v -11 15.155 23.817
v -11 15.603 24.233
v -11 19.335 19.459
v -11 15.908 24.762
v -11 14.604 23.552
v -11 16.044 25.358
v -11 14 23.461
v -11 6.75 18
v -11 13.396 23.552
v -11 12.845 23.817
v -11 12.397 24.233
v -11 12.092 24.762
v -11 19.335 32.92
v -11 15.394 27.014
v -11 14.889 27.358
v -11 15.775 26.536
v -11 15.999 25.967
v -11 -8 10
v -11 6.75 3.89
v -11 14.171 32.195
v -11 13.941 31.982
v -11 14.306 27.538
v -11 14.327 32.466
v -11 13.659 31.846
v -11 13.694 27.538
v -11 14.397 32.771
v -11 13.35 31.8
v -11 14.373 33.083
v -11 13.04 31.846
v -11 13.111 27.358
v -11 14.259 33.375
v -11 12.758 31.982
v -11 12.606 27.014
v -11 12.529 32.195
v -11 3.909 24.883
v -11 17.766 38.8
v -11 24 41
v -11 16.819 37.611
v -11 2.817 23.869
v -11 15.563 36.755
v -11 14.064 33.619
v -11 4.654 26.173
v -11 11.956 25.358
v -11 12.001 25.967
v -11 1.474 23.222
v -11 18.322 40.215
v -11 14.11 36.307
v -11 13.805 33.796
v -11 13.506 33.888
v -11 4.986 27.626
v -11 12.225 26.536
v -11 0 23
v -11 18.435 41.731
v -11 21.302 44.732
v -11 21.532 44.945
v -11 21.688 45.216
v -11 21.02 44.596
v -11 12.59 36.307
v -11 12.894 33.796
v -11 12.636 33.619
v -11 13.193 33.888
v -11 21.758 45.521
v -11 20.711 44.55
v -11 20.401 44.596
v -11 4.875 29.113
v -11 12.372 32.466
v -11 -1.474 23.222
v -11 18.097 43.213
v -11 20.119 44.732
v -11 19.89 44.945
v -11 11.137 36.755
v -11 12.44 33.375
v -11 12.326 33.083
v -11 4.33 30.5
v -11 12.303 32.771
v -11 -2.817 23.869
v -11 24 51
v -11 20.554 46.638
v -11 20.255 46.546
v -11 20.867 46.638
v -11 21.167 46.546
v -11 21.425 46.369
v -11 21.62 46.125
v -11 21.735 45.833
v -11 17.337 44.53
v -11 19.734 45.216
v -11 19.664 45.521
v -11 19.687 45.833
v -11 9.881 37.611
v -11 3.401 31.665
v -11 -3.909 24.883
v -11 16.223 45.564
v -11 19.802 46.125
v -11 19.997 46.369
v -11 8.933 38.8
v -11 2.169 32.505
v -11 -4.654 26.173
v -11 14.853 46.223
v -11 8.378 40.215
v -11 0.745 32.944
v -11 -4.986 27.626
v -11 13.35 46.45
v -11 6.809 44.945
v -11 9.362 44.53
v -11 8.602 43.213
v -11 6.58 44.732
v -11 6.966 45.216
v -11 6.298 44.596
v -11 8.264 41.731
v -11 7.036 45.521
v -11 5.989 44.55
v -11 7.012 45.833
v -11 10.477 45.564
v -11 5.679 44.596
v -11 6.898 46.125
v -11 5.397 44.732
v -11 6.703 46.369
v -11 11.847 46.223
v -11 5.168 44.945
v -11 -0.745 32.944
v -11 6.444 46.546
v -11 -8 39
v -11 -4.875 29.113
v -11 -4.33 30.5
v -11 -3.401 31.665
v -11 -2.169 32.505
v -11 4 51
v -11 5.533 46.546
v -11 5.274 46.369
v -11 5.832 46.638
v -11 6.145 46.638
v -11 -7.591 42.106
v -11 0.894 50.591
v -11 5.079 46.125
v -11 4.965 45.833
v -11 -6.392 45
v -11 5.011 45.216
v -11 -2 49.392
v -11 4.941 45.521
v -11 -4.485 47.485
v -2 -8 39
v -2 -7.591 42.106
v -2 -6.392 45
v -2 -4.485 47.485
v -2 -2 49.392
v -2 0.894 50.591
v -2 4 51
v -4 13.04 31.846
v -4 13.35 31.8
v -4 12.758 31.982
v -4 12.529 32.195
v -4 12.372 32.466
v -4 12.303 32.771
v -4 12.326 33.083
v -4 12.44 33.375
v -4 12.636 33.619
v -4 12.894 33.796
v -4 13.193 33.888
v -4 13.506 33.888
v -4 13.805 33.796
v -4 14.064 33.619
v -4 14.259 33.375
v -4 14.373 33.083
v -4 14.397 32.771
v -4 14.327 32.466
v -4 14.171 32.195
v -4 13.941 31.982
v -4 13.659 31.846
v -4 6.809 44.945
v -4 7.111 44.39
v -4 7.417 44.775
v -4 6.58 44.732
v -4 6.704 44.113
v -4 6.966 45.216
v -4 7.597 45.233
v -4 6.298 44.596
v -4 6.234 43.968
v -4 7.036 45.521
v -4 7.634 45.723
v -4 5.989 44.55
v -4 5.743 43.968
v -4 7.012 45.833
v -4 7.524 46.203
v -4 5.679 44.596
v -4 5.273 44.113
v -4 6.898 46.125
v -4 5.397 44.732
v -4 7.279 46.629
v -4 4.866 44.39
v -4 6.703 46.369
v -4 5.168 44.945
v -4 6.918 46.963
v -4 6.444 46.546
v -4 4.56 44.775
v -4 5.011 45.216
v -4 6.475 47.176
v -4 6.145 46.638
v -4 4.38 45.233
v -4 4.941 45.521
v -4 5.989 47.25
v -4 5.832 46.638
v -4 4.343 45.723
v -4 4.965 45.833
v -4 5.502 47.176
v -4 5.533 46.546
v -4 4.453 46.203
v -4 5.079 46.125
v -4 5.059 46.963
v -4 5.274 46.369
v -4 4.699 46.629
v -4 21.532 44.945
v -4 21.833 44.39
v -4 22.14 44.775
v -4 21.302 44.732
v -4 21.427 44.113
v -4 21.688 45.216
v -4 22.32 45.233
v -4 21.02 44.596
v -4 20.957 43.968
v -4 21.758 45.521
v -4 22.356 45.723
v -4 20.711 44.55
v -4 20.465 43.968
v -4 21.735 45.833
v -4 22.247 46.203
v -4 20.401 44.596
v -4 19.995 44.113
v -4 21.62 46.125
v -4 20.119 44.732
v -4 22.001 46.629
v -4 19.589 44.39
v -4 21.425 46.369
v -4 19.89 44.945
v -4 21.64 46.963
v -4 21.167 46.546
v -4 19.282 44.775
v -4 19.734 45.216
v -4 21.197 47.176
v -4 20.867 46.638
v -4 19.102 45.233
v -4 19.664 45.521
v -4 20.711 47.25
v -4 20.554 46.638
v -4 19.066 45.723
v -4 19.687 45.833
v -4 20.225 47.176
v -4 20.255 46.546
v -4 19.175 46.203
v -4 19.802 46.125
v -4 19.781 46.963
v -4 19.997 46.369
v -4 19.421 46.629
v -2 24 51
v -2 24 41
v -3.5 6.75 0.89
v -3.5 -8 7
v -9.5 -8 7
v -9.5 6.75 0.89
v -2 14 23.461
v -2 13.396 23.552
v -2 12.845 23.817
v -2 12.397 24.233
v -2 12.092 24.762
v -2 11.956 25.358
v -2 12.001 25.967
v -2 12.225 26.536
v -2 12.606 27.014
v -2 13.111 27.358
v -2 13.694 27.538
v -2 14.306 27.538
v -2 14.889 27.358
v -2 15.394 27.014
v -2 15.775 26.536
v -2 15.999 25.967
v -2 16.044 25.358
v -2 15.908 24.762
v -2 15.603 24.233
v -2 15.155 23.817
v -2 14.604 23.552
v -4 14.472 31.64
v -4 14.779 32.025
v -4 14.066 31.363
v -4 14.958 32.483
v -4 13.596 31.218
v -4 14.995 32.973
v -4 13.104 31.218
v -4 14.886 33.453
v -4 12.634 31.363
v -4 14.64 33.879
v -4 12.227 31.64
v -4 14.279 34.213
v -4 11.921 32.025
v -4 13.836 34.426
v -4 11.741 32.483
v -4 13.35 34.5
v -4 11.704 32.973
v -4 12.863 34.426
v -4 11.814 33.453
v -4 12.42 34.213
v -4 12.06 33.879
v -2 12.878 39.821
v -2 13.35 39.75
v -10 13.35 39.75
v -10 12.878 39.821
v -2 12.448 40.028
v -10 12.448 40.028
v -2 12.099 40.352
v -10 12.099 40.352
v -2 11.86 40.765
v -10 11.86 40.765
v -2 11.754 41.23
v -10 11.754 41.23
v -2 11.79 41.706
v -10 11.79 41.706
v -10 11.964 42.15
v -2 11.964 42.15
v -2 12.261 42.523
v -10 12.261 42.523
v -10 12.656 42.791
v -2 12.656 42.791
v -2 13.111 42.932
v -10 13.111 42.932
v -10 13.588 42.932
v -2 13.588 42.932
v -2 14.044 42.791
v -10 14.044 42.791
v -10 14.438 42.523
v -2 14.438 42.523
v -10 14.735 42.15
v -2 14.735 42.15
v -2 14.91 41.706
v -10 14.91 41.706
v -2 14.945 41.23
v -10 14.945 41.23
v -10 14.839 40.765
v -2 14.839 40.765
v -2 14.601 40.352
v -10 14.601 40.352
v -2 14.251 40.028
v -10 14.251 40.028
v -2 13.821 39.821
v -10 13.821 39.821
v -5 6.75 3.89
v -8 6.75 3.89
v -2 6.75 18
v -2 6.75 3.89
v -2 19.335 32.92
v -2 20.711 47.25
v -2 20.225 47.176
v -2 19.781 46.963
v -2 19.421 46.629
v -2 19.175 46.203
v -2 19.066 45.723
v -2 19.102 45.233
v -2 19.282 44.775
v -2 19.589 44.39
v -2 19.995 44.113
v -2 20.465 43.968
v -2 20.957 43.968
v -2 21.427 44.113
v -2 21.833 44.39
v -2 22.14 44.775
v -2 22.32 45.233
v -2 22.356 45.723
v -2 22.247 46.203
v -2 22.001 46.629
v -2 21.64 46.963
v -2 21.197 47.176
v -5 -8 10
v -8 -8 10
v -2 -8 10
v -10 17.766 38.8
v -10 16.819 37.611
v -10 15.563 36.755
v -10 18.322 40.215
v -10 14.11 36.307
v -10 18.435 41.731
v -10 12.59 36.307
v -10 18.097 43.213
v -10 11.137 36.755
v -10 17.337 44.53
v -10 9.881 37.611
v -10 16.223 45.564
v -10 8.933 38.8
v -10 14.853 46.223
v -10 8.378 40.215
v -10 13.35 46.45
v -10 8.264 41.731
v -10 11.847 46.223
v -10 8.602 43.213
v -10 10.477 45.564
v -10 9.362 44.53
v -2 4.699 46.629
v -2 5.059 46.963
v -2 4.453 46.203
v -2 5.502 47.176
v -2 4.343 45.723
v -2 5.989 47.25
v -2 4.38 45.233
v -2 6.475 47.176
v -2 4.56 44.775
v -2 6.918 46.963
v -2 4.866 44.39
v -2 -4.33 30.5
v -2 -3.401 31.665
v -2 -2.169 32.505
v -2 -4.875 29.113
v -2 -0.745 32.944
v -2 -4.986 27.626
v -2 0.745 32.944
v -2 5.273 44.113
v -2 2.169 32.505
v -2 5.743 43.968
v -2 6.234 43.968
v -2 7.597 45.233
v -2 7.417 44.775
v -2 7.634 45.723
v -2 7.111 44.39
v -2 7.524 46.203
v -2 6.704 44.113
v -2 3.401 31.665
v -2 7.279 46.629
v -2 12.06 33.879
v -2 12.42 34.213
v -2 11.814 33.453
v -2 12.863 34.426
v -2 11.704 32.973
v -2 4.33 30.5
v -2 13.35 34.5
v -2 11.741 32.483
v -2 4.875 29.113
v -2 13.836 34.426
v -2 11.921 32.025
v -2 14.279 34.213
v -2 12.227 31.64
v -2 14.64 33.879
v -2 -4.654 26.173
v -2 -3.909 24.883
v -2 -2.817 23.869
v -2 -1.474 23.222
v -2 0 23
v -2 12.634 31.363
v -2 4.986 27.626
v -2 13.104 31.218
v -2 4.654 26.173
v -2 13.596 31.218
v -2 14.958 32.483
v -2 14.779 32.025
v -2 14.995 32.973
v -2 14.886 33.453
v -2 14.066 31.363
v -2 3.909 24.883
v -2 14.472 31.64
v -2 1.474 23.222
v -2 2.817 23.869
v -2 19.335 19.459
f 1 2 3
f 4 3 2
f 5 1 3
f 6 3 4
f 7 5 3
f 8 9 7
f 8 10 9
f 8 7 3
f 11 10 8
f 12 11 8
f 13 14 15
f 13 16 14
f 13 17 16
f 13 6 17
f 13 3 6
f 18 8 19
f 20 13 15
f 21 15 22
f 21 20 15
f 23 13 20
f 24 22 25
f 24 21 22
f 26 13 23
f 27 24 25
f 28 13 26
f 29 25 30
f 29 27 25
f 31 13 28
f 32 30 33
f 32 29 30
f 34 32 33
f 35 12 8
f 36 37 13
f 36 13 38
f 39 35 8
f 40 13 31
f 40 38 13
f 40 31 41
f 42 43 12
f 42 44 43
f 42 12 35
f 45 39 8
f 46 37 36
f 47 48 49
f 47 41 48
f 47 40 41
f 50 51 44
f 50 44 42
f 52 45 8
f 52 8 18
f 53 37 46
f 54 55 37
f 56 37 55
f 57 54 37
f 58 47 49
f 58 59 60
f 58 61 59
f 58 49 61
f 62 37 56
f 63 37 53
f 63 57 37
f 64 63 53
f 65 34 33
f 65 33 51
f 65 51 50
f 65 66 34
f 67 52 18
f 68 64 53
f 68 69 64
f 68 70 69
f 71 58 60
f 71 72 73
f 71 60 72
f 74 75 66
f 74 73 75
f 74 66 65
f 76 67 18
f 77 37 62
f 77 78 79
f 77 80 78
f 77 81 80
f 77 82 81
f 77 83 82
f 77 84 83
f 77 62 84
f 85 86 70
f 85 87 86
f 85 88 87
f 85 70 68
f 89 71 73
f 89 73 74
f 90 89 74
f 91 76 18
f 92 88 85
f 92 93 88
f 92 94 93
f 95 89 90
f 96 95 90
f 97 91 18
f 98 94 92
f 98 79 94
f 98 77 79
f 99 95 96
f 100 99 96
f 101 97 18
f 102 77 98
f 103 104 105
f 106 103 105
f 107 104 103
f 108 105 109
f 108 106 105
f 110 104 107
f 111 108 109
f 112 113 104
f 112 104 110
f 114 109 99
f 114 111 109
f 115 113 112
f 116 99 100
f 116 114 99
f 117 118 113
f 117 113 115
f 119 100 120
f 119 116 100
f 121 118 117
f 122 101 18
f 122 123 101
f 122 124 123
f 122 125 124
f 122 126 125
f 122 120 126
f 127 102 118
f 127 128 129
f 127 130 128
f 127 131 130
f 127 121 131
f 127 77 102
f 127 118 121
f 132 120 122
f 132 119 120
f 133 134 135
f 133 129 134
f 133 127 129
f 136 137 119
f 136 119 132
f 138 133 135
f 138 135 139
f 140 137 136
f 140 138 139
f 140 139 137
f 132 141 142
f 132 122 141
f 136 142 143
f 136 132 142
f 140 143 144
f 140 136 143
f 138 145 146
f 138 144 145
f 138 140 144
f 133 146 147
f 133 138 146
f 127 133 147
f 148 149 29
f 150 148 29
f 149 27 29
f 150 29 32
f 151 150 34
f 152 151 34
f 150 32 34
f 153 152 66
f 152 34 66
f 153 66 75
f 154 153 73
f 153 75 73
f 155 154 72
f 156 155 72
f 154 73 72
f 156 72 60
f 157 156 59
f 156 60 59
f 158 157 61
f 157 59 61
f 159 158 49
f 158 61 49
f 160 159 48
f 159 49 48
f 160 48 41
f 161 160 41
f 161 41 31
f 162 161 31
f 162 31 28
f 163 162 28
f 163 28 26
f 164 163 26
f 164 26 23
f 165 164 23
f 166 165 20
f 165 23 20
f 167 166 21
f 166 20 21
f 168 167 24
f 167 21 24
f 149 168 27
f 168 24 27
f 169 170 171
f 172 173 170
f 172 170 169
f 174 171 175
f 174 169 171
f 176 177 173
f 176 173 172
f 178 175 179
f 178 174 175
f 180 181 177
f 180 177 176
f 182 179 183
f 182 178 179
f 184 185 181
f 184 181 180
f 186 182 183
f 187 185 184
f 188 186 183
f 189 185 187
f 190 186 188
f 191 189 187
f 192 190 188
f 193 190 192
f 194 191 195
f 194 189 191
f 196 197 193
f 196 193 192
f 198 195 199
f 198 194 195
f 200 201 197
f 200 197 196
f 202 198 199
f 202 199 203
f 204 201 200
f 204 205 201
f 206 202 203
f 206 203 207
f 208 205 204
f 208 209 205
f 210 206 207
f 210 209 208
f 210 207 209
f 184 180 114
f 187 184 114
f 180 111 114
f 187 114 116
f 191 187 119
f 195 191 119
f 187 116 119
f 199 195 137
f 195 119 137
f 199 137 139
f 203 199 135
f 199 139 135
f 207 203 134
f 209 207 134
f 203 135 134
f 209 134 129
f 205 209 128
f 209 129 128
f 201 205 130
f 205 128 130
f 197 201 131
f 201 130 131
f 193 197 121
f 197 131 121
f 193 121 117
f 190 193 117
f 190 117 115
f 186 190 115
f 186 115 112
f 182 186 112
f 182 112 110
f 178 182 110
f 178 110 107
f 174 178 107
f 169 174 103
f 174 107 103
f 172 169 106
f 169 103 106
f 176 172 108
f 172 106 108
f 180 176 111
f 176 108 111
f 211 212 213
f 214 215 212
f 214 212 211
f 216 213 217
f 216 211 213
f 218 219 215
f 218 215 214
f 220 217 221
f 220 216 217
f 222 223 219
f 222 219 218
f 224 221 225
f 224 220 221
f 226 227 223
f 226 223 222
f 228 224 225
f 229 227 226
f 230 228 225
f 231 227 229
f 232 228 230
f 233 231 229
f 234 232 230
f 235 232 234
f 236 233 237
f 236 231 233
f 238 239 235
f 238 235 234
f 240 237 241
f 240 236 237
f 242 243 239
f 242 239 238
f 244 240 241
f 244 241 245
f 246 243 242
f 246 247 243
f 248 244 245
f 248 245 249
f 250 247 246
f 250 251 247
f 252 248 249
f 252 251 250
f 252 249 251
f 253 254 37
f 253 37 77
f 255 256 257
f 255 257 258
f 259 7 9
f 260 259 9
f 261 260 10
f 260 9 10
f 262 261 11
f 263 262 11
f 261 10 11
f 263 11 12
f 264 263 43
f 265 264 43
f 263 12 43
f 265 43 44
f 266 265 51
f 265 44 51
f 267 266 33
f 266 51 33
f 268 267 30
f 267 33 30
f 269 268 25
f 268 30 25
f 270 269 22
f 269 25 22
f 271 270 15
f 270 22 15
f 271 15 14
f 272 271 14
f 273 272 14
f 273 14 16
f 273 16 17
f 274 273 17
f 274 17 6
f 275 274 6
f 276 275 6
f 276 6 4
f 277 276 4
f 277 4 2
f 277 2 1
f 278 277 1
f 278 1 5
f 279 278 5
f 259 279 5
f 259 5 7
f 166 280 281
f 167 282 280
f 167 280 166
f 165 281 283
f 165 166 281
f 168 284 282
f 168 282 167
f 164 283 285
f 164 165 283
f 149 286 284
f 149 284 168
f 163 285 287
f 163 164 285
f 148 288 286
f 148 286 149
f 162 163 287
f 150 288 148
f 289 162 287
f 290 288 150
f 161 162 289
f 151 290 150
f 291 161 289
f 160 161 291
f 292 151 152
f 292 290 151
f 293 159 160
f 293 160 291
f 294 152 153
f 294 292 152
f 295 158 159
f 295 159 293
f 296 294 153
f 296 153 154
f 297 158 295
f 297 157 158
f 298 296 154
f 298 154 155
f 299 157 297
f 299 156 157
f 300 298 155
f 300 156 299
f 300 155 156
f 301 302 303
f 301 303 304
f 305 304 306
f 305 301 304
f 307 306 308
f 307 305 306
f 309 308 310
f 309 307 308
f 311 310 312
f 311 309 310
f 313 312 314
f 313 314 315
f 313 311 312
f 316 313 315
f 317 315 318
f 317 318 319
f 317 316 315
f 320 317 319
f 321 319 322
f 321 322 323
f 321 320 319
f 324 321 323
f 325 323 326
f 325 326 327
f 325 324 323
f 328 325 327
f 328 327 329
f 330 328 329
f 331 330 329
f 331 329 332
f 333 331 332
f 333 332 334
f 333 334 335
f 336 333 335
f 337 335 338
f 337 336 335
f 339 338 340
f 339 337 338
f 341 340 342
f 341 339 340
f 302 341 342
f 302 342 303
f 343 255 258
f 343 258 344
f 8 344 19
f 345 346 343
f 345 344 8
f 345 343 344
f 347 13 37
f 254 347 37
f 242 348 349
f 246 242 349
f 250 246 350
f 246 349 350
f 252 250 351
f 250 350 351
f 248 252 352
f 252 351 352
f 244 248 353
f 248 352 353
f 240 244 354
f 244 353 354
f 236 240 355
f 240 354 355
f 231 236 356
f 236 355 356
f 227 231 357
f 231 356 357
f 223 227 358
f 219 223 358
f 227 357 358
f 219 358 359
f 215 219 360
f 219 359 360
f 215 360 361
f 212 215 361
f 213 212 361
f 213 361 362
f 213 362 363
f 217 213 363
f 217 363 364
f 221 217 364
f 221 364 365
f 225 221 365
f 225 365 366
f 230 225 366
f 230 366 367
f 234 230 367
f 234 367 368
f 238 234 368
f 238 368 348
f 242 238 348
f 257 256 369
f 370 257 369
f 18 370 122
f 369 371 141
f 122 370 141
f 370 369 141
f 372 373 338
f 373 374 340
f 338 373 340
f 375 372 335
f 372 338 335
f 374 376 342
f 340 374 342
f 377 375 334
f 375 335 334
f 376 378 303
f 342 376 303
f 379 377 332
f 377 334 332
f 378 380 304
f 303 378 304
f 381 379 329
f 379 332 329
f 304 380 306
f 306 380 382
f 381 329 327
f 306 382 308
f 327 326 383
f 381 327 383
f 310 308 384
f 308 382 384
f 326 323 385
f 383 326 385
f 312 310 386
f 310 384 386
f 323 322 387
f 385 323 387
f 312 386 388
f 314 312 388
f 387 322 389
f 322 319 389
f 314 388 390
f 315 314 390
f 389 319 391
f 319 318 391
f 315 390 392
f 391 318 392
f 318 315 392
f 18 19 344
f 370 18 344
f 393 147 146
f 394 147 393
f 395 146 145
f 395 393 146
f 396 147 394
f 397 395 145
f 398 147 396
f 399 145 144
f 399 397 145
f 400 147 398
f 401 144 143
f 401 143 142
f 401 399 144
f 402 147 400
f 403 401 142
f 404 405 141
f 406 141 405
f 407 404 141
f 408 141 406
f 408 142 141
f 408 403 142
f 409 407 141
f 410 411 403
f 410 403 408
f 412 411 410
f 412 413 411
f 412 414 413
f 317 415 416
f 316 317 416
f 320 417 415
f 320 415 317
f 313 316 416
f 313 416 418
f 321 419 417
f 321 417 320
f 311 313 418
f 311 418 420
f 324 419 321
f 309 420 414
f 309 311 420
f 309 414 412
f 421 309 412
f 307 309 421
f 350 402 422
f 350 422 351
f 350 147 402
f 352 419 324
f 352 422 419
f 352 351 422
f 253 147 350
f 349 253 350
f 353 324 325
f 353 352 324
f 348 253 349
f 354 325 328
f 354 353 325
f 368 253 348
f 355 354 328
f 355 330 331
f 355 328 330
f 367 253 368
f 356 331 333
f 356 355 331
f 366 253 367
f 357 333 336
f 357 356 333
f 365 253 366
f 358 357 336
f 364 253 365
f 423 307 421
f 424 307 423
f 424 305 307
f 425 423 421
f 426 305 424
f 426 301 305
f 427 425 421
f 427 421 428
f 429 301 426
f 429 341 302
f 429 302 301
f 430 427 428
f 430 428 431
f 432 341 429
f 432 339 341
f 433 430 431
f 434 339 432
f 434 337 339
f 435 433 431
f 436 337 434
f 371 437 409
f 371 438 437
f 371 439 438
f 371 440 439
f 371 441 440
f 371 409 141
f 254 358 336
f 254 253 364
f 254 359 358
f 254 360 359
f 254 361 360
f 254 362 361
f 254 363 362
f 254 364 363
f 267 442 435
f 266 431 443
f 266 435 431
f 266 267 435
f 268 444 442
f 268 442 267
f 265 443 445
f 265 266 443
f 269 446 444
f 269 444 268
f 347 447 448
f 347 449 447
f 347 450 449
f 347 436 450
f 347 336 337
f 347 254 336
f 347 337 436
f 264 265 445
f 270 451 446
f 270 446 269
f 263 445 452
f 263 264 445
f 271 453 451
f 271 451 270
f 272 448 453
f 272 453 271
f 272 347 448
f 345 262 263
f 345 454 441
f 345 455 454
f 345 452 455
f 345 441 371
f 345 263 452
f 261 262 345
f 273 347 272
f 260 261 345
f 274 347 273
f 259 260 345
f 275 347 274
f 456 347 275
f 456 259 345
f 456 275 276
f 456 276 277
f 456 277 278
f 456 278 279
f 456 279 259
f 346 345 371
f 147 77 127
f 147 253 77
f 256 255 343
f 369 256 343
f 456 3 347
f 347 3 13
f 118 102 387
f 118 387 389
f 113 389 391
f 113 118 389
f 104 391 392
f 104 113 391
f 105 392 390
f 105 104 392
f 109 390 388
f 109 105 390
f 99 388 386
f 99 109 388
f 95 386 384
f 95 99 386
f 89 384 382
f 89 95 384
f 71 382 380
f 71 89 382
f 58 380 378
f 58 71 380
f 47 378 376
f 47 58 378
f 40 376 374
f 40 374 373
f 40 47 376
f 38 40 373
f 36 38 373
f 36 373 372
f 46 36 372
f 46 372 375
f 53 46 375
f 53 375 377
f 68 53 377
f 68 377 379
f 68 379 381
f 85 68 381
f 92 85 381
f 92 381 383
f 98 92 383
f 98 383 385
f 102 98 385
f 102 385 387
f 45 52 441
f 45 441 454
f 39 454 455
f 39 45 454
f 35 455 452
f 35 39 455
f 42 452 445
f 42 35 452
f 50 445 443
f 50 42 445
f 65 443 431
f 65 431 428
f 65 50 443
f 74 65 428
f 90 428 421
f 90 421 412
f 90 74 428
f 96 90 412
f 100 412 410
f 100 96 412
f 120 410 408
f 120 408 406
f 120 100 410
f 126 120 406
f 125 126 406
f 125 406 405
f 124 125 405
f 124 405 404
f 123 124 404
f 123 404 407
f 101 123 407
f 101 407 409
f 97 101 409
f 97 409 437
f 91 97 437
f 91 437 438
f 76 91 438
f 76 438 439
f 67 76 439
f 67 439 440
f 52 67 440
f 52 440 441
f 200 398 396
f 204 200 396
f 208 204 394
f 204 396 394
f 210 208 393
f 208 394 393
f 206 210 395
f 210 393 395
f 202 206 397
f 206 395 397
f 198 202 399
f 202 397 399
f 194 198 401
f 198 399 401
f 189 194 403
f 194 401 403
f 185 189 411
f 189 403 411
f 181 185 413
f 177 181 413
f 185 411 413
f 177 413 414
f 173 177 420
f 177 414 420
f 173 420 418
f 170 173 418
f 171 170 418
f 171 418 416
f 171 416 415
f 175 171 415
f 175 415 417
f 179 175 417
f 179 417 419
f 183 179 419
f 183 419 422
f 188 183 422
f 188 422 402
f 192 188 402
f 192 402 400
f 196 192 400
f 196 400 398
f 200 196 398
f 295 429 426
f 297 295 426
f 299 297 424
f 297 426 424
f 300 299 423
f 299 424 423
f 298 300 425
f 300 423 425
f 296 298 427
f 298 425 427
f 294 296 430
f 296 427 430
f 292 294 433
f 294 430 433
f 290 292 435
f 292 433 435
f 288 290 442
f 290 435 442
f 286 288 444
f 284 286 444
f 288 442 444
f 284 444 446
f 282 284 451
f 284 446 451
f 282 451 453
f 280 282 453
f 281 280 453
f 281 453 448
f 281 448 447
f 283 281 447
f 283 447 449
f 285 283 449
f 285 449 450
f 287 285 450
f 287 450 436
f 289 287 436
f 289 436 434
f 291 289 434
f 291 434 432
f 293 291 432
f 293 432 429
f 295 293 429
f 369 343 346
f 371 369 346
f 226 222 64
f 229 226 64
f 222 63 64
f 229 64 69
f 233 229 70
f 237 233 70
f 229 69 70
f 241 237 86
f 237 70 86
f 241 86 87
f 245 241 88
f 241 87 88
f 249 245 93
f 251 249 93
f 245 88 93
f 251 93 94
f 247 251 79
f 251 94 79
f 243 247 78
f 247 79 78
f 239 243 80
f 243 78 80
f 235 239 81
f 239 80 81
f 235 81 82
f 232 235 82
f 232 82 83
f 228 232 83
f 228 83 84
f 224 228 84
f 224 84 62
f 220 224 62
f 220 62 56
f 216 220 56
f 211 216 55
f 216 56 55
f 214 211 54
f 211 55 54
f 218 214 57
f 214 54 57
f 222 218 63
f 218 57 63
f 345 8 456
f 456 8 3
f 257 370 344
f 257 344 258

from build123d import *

# Parameters (mm, degrees)
SKETCH1_W                                        = 32
SKETCH1_H                                        = 52
BOSS_EXTRUDE1_DEPTH                              = 9
CUT_EXTRUDE2_DEPTH                               = 58.078892771
F_10_0_10_DIAMETER_HOLE1_D                       = 10
FILLET3_R                                        = 12
CUT_EXTRUDE3_DEPTH                               = 58.078892771
M4X0_7_TAPPED_HOLE2_D                            = 2.1
M4X0_7_TAPPED_HOLE2_CBORE_D                      = 3.3
M4X0_7_TAPPED_HOLE2_CBORE_DEPTH                  = 2
CBORE_FOR_M3_HEX_HEAD_MACHINE_SCREW5_D           = 3.2
CBORE_FOR_M3_HEX_HEAD_MACHINE_SCREW5_CBORE_D     = 10.2
CBORE_FOR_M3_HEX_HEAD_MACHINE_SCREW5_CBORE_DEPTH = 1
F_4_1_4_1_DIAMETER_HOLE3_D                       = 4.1
CUT_EXTRUDE4_DEPTH                               = 58.078892771
FILLET3_OF_MIRROR11_R                            = 12
CUT_EXTRUDE5_START                               = -9
CUT_EXTRUDE5_OUTLINE_R                           = 5
CUT_EXTRUDE5_OUTLINE_R_2                         = 2.05
CUT_EXTRUDE5_OUTLINE_R_3                         = 1.05
CUT_EXTRUDE5_OUTLINE_R_4                         = 1.6
CUT_EXTRUDE5_DEPTH                               = 9
F_4_1_4_1_DIAMETER_HOLE8_D                       = 4.1
M4X0_7_TAPPED_HOLE3_D                            = 2.1
M4X0_7_TAPPED_HOLE3_CBORE_D                      = 3.3
M4X0_7_TAPPED_HOLE3_CBORE_DEPTH                  = 2


# Read off the part's stored shape, not the designer's step: Cut-Extrude5
with BuildPart() as part:
    # Sketch1 → Boss-Extrude1 (new body)
    with BuildSketch(Plane(origin=(-2, 0, 0), x_dir=(0, -1, 0), z_dir=(-1, 0, 0))):
        with Locations((-8, 25)):
            Rectangle(SKETCH1_W, SKETCH1_H)
    boss_extrude1 = extrude(amount=-BOSS_EXTRUDE1_DEPTH)

    # Sketch3 → Cut-Extrude2 (cut, through all)
    with BuildSketch(Plane(origin=(7, 0, 0), x_dir=(0, 0, -1), z_dir=(1, 0, 0))):
        Polygon((4, 6.75), (-18, 6.75), (-20, 24), (4, 24), align=None)
    cut_extrude2 = extrude(amount=-CUT_EXTRUDE2_DEPTH, mode=Mode.SUBTRACT)

    # Ø10.0 (10) Diameter Hole1 (through all)
    with Locations(Plane.ZY.offset(2)):
        with Locations((28, 0)):
            f_10_0_10_diameter_hole1 = Hole(F_10_0_10_DIAMETER_HOLE1_D / 2)

    # Fillet3
    fillet3_edges = [part.edges().sort_by_distance(p)[0] for p in [
        (2.5, -8, 51),
    ]]
    fillet(fillet3_edges, radius=FILLET3_R)

    # Cut-Sweep1: sweep along a path in Sketch22
    with BuildLine(Plane(origin=(-2, 0, 0), x_dir=(0, -1, 0), z_dir=(-1, 0, 0))) as cut_sweep1_path:
        Line((8, 11), (-6.75, 4.890349955))
    # Sketch21 → Cut-Sweep1 (sweep, cut)
    with BuildSketch(Plane.XZ.offset(8)):
        Polygon((7, 7), (5.5, 7), (4, 10), (7, 10), align=None)
        Polygon((1, 10), (-0.5, 7), (-2, 7), (-2, 10), align=None)
    cut_sweep1 = sweep(path=cut_sweep1_path.line, mode=Mode.SUBTRACT)

    # Sketch23 → Cut-Extrude3 (cut, symmetric)
    with BuildSketch(Plane.ZY.offset(2)):
        Polygon((-1, 6.75), (-1, -8), (7, -8), (0.890349955, 6.75), align=None)
    cut_extrude3 = extrude(amount=CUT_EXTRUDE3_DEPTH, both=True, mode=Mode.SUBTRACT)

    # M4x0.7 Tapped Hole2 (through all)
    with Locations(Plane(origin=(-2, 13.349760492, 32.849760492), x_dir=(0, 0, -1), z_dir=(-1, 0, 0))):
        with Locations((0, 0), (-12.75, -7.361215932), (-12.75, 7.361215932)):
            CounterBoreHole(M4X0_7_TAPPED_HOLE2_D / 2, M4X0_7_TAPPED_HOLE2_CBORE_D / 2, M4X0_7_TAPPED_HOLE2_CBORE_DEPTH)

    # CBORE for M3 Hex Head Machine Screw5 (through all)
    with Locations(Plane(origin=(7, 13.349760492, 41.349760492), x_dir=(0, 0, 1), z_dir=(1, 0, 0))):
        with Locations((0, 0)):
            cbore_for_m3_hex_head_machine_screw5 = CounterBoreHole(CBORE_FOR_M3_HEX_HEAD_MACHINE_SCREW5_D / 2, CBORE_FOR_M3_HEX_HEAD_MACHINE_SCREW5_CBORE_D / 2, CBORE_FOR_M3_HEX_HEAD_MACHINE_SCREW5_CBORE_DEPTH)

    # Ø4.1 (4.1) Diameter Hole3 (through all)
    with Locations(Plane(origin=(-2, 14, 25.510762466), x_dir=(0, 0, -1), z_dir=(-1, 0, 0))):
        with Locations((0, 0)):
            Hole(F_4_1_4_1_DIAMETER_HOLE3_D / 2)

    # Sketch37 → Cut-Extrude4 (cut, symmetric)
    with BuildSketch(Plane.ZY.offset(2)):
        Polygon((32.919624828, 19.334793219), (41, 24), (20, 24), (19.867875139, 22.860423075), (19.45910646, 19.334793219), align=None)
    cut_extrude4 = extrude(amount=CUT_EXTRUDE4_DEPTH, both=True, mode=Mode.SUBTRACT)

    # Mirror11: Boss-Extrude1, Cut-Extrude2, Ø10.0 (10) Diameter Hole1, Cut-Sweep1, Cut-Extrude3, CBORE for M3 Hex Head Machine Screw5, Cut-Extrude4 across plane
    add(boss_extrude1.mirror(Plane.ZY.offset(2)))
    add(cut_extrude2.mirror(Plane.ZY.offset(2)), mode=Mode.SUBTRACT)
    add(f_10_0_10_diameter_hole1.mirror(Plane.ZY.offset(2)), mode=Mode.SUBTRACT)
    add(cut_sweep1.mirror(Plane.ZY.offset(2)), mode=Mode.SUBTRACT)
    add(cut_extrude3.mirror(Plane.ZY.offset(2)), mode=Mode.SUBTRACT)
    add(cbore_for_m3_hex_head_machine_screw5.mirror(Plane.ZY.offset(2)), mode=Mode.SUBTRACT)
    add(cut_extrude4.mirror(Plane.ZY.offset(2)), mode=Mode.SUBTRACT)

    # Fillet3 of Mirror11
    fillet3_of_mirror11_edges = [part.edges().sort_by_distance(p)[0] for p in [
        (-6.5, -8, 51),
    ]]
    fillet(fillet3_of_mirror11_edges, radius=FILLET3_OF_MIRROR11_R)

    # Cut-Extrude5 outline → Cut-Extrude5 (cut)
    with BuildSketch(Plane(origin=(7, 0, 0), x_dir=(0, 0, -1), z_dir=(1, 0, 0)).offset(CUT_EXTRUDE5_START)):
        with BuildLine():
            Line((-32.919624828, 19.334793219), (-41, 24))
            Line((-41, 24), (-51, 24))
            Line((-51, 24), (-51, 4))
            ThreePointArc((-51, 4), (-47.485281374, -4.485281374), (-39, -8))
            Line((-39, -8), (-7, -8))
            Line((-7, -8), (-0.890349955, 6.75))
            Line((-0.890349955, 6.75), (-18, 6.75))
            Line((-18, 6.75), (-19.45910646, 19.334793219))
            Line((-19.45910646, 19.334793219), (-32.919624828, 19.334793219))
        make_face()
        with Locations((-28, 0)):
            Circle(CUT_EXTRUDE5_OUTLINE_R, mode=Mode.SUBTRACT)
        with Locations((-25.510762466, 14)):
            Circle(CUT_EXTRUDE5_OUTLINE_R_2, mode=Mode.SUBTRACT)
        with Locations((-45.599760492, 5.98854456)):
            Circle(CUT_EXTRUDE5_OUTLINE_R_3, mode=Mode.SUBTRACT)
        with Locations((-41.349760492, 13.349760492)):
            Circle(CUT_EXTRUDE5_OUTLINE_R_4, mode=Mode.SUBTRACT)
        with Locations((-32.849760492, 13.349760492)):
            Circle(CUT_EXTRUDE5_OUTLINE_R_3, mode=Mode.SUBTRACT)
        with Locations((-45.599760492, 20.710976424)):
            Circle(CUT_EXTRUDE5_OUTLINE_R_3, mode=Mode.SUBTRACT)
    extrude(amount=CUT_EXTRUDE5_DEPTH, mode=Mode.SUBTRACT)

    # Ø4.1 (4.1) Diameter Hole8 (through all)
    with Locations(Plane(origin=(-2, 14, 25.510762466), x_dir=(0, 0, 1), z_dir=(1, 0, 0))):
        with Locations((0, 0)):
            Hole(F_4_1_4_1_DIAMETER_HOLE8_D / 2)

    # M4x0.7 Tapped Hole3 (through all)
    with Locations(Plane(origin=(-2, 13.349760492, 32.849760492), x_dir=(0, 0, 1), z_dir=(1, 0, 0))):
        with Locations((0, 0), (12.75, -7.361215932), (12.75, 7.361215932)):
            CounterBoreHole(M4X0_7_TAPPED_HOLE3_D / 2, M4X0_7_TAPPED_HOLE3_CBORE_D / 2, M4X0_7_TAPPED_HOLE3_CBORE_DEPTH)


solid = part.part
